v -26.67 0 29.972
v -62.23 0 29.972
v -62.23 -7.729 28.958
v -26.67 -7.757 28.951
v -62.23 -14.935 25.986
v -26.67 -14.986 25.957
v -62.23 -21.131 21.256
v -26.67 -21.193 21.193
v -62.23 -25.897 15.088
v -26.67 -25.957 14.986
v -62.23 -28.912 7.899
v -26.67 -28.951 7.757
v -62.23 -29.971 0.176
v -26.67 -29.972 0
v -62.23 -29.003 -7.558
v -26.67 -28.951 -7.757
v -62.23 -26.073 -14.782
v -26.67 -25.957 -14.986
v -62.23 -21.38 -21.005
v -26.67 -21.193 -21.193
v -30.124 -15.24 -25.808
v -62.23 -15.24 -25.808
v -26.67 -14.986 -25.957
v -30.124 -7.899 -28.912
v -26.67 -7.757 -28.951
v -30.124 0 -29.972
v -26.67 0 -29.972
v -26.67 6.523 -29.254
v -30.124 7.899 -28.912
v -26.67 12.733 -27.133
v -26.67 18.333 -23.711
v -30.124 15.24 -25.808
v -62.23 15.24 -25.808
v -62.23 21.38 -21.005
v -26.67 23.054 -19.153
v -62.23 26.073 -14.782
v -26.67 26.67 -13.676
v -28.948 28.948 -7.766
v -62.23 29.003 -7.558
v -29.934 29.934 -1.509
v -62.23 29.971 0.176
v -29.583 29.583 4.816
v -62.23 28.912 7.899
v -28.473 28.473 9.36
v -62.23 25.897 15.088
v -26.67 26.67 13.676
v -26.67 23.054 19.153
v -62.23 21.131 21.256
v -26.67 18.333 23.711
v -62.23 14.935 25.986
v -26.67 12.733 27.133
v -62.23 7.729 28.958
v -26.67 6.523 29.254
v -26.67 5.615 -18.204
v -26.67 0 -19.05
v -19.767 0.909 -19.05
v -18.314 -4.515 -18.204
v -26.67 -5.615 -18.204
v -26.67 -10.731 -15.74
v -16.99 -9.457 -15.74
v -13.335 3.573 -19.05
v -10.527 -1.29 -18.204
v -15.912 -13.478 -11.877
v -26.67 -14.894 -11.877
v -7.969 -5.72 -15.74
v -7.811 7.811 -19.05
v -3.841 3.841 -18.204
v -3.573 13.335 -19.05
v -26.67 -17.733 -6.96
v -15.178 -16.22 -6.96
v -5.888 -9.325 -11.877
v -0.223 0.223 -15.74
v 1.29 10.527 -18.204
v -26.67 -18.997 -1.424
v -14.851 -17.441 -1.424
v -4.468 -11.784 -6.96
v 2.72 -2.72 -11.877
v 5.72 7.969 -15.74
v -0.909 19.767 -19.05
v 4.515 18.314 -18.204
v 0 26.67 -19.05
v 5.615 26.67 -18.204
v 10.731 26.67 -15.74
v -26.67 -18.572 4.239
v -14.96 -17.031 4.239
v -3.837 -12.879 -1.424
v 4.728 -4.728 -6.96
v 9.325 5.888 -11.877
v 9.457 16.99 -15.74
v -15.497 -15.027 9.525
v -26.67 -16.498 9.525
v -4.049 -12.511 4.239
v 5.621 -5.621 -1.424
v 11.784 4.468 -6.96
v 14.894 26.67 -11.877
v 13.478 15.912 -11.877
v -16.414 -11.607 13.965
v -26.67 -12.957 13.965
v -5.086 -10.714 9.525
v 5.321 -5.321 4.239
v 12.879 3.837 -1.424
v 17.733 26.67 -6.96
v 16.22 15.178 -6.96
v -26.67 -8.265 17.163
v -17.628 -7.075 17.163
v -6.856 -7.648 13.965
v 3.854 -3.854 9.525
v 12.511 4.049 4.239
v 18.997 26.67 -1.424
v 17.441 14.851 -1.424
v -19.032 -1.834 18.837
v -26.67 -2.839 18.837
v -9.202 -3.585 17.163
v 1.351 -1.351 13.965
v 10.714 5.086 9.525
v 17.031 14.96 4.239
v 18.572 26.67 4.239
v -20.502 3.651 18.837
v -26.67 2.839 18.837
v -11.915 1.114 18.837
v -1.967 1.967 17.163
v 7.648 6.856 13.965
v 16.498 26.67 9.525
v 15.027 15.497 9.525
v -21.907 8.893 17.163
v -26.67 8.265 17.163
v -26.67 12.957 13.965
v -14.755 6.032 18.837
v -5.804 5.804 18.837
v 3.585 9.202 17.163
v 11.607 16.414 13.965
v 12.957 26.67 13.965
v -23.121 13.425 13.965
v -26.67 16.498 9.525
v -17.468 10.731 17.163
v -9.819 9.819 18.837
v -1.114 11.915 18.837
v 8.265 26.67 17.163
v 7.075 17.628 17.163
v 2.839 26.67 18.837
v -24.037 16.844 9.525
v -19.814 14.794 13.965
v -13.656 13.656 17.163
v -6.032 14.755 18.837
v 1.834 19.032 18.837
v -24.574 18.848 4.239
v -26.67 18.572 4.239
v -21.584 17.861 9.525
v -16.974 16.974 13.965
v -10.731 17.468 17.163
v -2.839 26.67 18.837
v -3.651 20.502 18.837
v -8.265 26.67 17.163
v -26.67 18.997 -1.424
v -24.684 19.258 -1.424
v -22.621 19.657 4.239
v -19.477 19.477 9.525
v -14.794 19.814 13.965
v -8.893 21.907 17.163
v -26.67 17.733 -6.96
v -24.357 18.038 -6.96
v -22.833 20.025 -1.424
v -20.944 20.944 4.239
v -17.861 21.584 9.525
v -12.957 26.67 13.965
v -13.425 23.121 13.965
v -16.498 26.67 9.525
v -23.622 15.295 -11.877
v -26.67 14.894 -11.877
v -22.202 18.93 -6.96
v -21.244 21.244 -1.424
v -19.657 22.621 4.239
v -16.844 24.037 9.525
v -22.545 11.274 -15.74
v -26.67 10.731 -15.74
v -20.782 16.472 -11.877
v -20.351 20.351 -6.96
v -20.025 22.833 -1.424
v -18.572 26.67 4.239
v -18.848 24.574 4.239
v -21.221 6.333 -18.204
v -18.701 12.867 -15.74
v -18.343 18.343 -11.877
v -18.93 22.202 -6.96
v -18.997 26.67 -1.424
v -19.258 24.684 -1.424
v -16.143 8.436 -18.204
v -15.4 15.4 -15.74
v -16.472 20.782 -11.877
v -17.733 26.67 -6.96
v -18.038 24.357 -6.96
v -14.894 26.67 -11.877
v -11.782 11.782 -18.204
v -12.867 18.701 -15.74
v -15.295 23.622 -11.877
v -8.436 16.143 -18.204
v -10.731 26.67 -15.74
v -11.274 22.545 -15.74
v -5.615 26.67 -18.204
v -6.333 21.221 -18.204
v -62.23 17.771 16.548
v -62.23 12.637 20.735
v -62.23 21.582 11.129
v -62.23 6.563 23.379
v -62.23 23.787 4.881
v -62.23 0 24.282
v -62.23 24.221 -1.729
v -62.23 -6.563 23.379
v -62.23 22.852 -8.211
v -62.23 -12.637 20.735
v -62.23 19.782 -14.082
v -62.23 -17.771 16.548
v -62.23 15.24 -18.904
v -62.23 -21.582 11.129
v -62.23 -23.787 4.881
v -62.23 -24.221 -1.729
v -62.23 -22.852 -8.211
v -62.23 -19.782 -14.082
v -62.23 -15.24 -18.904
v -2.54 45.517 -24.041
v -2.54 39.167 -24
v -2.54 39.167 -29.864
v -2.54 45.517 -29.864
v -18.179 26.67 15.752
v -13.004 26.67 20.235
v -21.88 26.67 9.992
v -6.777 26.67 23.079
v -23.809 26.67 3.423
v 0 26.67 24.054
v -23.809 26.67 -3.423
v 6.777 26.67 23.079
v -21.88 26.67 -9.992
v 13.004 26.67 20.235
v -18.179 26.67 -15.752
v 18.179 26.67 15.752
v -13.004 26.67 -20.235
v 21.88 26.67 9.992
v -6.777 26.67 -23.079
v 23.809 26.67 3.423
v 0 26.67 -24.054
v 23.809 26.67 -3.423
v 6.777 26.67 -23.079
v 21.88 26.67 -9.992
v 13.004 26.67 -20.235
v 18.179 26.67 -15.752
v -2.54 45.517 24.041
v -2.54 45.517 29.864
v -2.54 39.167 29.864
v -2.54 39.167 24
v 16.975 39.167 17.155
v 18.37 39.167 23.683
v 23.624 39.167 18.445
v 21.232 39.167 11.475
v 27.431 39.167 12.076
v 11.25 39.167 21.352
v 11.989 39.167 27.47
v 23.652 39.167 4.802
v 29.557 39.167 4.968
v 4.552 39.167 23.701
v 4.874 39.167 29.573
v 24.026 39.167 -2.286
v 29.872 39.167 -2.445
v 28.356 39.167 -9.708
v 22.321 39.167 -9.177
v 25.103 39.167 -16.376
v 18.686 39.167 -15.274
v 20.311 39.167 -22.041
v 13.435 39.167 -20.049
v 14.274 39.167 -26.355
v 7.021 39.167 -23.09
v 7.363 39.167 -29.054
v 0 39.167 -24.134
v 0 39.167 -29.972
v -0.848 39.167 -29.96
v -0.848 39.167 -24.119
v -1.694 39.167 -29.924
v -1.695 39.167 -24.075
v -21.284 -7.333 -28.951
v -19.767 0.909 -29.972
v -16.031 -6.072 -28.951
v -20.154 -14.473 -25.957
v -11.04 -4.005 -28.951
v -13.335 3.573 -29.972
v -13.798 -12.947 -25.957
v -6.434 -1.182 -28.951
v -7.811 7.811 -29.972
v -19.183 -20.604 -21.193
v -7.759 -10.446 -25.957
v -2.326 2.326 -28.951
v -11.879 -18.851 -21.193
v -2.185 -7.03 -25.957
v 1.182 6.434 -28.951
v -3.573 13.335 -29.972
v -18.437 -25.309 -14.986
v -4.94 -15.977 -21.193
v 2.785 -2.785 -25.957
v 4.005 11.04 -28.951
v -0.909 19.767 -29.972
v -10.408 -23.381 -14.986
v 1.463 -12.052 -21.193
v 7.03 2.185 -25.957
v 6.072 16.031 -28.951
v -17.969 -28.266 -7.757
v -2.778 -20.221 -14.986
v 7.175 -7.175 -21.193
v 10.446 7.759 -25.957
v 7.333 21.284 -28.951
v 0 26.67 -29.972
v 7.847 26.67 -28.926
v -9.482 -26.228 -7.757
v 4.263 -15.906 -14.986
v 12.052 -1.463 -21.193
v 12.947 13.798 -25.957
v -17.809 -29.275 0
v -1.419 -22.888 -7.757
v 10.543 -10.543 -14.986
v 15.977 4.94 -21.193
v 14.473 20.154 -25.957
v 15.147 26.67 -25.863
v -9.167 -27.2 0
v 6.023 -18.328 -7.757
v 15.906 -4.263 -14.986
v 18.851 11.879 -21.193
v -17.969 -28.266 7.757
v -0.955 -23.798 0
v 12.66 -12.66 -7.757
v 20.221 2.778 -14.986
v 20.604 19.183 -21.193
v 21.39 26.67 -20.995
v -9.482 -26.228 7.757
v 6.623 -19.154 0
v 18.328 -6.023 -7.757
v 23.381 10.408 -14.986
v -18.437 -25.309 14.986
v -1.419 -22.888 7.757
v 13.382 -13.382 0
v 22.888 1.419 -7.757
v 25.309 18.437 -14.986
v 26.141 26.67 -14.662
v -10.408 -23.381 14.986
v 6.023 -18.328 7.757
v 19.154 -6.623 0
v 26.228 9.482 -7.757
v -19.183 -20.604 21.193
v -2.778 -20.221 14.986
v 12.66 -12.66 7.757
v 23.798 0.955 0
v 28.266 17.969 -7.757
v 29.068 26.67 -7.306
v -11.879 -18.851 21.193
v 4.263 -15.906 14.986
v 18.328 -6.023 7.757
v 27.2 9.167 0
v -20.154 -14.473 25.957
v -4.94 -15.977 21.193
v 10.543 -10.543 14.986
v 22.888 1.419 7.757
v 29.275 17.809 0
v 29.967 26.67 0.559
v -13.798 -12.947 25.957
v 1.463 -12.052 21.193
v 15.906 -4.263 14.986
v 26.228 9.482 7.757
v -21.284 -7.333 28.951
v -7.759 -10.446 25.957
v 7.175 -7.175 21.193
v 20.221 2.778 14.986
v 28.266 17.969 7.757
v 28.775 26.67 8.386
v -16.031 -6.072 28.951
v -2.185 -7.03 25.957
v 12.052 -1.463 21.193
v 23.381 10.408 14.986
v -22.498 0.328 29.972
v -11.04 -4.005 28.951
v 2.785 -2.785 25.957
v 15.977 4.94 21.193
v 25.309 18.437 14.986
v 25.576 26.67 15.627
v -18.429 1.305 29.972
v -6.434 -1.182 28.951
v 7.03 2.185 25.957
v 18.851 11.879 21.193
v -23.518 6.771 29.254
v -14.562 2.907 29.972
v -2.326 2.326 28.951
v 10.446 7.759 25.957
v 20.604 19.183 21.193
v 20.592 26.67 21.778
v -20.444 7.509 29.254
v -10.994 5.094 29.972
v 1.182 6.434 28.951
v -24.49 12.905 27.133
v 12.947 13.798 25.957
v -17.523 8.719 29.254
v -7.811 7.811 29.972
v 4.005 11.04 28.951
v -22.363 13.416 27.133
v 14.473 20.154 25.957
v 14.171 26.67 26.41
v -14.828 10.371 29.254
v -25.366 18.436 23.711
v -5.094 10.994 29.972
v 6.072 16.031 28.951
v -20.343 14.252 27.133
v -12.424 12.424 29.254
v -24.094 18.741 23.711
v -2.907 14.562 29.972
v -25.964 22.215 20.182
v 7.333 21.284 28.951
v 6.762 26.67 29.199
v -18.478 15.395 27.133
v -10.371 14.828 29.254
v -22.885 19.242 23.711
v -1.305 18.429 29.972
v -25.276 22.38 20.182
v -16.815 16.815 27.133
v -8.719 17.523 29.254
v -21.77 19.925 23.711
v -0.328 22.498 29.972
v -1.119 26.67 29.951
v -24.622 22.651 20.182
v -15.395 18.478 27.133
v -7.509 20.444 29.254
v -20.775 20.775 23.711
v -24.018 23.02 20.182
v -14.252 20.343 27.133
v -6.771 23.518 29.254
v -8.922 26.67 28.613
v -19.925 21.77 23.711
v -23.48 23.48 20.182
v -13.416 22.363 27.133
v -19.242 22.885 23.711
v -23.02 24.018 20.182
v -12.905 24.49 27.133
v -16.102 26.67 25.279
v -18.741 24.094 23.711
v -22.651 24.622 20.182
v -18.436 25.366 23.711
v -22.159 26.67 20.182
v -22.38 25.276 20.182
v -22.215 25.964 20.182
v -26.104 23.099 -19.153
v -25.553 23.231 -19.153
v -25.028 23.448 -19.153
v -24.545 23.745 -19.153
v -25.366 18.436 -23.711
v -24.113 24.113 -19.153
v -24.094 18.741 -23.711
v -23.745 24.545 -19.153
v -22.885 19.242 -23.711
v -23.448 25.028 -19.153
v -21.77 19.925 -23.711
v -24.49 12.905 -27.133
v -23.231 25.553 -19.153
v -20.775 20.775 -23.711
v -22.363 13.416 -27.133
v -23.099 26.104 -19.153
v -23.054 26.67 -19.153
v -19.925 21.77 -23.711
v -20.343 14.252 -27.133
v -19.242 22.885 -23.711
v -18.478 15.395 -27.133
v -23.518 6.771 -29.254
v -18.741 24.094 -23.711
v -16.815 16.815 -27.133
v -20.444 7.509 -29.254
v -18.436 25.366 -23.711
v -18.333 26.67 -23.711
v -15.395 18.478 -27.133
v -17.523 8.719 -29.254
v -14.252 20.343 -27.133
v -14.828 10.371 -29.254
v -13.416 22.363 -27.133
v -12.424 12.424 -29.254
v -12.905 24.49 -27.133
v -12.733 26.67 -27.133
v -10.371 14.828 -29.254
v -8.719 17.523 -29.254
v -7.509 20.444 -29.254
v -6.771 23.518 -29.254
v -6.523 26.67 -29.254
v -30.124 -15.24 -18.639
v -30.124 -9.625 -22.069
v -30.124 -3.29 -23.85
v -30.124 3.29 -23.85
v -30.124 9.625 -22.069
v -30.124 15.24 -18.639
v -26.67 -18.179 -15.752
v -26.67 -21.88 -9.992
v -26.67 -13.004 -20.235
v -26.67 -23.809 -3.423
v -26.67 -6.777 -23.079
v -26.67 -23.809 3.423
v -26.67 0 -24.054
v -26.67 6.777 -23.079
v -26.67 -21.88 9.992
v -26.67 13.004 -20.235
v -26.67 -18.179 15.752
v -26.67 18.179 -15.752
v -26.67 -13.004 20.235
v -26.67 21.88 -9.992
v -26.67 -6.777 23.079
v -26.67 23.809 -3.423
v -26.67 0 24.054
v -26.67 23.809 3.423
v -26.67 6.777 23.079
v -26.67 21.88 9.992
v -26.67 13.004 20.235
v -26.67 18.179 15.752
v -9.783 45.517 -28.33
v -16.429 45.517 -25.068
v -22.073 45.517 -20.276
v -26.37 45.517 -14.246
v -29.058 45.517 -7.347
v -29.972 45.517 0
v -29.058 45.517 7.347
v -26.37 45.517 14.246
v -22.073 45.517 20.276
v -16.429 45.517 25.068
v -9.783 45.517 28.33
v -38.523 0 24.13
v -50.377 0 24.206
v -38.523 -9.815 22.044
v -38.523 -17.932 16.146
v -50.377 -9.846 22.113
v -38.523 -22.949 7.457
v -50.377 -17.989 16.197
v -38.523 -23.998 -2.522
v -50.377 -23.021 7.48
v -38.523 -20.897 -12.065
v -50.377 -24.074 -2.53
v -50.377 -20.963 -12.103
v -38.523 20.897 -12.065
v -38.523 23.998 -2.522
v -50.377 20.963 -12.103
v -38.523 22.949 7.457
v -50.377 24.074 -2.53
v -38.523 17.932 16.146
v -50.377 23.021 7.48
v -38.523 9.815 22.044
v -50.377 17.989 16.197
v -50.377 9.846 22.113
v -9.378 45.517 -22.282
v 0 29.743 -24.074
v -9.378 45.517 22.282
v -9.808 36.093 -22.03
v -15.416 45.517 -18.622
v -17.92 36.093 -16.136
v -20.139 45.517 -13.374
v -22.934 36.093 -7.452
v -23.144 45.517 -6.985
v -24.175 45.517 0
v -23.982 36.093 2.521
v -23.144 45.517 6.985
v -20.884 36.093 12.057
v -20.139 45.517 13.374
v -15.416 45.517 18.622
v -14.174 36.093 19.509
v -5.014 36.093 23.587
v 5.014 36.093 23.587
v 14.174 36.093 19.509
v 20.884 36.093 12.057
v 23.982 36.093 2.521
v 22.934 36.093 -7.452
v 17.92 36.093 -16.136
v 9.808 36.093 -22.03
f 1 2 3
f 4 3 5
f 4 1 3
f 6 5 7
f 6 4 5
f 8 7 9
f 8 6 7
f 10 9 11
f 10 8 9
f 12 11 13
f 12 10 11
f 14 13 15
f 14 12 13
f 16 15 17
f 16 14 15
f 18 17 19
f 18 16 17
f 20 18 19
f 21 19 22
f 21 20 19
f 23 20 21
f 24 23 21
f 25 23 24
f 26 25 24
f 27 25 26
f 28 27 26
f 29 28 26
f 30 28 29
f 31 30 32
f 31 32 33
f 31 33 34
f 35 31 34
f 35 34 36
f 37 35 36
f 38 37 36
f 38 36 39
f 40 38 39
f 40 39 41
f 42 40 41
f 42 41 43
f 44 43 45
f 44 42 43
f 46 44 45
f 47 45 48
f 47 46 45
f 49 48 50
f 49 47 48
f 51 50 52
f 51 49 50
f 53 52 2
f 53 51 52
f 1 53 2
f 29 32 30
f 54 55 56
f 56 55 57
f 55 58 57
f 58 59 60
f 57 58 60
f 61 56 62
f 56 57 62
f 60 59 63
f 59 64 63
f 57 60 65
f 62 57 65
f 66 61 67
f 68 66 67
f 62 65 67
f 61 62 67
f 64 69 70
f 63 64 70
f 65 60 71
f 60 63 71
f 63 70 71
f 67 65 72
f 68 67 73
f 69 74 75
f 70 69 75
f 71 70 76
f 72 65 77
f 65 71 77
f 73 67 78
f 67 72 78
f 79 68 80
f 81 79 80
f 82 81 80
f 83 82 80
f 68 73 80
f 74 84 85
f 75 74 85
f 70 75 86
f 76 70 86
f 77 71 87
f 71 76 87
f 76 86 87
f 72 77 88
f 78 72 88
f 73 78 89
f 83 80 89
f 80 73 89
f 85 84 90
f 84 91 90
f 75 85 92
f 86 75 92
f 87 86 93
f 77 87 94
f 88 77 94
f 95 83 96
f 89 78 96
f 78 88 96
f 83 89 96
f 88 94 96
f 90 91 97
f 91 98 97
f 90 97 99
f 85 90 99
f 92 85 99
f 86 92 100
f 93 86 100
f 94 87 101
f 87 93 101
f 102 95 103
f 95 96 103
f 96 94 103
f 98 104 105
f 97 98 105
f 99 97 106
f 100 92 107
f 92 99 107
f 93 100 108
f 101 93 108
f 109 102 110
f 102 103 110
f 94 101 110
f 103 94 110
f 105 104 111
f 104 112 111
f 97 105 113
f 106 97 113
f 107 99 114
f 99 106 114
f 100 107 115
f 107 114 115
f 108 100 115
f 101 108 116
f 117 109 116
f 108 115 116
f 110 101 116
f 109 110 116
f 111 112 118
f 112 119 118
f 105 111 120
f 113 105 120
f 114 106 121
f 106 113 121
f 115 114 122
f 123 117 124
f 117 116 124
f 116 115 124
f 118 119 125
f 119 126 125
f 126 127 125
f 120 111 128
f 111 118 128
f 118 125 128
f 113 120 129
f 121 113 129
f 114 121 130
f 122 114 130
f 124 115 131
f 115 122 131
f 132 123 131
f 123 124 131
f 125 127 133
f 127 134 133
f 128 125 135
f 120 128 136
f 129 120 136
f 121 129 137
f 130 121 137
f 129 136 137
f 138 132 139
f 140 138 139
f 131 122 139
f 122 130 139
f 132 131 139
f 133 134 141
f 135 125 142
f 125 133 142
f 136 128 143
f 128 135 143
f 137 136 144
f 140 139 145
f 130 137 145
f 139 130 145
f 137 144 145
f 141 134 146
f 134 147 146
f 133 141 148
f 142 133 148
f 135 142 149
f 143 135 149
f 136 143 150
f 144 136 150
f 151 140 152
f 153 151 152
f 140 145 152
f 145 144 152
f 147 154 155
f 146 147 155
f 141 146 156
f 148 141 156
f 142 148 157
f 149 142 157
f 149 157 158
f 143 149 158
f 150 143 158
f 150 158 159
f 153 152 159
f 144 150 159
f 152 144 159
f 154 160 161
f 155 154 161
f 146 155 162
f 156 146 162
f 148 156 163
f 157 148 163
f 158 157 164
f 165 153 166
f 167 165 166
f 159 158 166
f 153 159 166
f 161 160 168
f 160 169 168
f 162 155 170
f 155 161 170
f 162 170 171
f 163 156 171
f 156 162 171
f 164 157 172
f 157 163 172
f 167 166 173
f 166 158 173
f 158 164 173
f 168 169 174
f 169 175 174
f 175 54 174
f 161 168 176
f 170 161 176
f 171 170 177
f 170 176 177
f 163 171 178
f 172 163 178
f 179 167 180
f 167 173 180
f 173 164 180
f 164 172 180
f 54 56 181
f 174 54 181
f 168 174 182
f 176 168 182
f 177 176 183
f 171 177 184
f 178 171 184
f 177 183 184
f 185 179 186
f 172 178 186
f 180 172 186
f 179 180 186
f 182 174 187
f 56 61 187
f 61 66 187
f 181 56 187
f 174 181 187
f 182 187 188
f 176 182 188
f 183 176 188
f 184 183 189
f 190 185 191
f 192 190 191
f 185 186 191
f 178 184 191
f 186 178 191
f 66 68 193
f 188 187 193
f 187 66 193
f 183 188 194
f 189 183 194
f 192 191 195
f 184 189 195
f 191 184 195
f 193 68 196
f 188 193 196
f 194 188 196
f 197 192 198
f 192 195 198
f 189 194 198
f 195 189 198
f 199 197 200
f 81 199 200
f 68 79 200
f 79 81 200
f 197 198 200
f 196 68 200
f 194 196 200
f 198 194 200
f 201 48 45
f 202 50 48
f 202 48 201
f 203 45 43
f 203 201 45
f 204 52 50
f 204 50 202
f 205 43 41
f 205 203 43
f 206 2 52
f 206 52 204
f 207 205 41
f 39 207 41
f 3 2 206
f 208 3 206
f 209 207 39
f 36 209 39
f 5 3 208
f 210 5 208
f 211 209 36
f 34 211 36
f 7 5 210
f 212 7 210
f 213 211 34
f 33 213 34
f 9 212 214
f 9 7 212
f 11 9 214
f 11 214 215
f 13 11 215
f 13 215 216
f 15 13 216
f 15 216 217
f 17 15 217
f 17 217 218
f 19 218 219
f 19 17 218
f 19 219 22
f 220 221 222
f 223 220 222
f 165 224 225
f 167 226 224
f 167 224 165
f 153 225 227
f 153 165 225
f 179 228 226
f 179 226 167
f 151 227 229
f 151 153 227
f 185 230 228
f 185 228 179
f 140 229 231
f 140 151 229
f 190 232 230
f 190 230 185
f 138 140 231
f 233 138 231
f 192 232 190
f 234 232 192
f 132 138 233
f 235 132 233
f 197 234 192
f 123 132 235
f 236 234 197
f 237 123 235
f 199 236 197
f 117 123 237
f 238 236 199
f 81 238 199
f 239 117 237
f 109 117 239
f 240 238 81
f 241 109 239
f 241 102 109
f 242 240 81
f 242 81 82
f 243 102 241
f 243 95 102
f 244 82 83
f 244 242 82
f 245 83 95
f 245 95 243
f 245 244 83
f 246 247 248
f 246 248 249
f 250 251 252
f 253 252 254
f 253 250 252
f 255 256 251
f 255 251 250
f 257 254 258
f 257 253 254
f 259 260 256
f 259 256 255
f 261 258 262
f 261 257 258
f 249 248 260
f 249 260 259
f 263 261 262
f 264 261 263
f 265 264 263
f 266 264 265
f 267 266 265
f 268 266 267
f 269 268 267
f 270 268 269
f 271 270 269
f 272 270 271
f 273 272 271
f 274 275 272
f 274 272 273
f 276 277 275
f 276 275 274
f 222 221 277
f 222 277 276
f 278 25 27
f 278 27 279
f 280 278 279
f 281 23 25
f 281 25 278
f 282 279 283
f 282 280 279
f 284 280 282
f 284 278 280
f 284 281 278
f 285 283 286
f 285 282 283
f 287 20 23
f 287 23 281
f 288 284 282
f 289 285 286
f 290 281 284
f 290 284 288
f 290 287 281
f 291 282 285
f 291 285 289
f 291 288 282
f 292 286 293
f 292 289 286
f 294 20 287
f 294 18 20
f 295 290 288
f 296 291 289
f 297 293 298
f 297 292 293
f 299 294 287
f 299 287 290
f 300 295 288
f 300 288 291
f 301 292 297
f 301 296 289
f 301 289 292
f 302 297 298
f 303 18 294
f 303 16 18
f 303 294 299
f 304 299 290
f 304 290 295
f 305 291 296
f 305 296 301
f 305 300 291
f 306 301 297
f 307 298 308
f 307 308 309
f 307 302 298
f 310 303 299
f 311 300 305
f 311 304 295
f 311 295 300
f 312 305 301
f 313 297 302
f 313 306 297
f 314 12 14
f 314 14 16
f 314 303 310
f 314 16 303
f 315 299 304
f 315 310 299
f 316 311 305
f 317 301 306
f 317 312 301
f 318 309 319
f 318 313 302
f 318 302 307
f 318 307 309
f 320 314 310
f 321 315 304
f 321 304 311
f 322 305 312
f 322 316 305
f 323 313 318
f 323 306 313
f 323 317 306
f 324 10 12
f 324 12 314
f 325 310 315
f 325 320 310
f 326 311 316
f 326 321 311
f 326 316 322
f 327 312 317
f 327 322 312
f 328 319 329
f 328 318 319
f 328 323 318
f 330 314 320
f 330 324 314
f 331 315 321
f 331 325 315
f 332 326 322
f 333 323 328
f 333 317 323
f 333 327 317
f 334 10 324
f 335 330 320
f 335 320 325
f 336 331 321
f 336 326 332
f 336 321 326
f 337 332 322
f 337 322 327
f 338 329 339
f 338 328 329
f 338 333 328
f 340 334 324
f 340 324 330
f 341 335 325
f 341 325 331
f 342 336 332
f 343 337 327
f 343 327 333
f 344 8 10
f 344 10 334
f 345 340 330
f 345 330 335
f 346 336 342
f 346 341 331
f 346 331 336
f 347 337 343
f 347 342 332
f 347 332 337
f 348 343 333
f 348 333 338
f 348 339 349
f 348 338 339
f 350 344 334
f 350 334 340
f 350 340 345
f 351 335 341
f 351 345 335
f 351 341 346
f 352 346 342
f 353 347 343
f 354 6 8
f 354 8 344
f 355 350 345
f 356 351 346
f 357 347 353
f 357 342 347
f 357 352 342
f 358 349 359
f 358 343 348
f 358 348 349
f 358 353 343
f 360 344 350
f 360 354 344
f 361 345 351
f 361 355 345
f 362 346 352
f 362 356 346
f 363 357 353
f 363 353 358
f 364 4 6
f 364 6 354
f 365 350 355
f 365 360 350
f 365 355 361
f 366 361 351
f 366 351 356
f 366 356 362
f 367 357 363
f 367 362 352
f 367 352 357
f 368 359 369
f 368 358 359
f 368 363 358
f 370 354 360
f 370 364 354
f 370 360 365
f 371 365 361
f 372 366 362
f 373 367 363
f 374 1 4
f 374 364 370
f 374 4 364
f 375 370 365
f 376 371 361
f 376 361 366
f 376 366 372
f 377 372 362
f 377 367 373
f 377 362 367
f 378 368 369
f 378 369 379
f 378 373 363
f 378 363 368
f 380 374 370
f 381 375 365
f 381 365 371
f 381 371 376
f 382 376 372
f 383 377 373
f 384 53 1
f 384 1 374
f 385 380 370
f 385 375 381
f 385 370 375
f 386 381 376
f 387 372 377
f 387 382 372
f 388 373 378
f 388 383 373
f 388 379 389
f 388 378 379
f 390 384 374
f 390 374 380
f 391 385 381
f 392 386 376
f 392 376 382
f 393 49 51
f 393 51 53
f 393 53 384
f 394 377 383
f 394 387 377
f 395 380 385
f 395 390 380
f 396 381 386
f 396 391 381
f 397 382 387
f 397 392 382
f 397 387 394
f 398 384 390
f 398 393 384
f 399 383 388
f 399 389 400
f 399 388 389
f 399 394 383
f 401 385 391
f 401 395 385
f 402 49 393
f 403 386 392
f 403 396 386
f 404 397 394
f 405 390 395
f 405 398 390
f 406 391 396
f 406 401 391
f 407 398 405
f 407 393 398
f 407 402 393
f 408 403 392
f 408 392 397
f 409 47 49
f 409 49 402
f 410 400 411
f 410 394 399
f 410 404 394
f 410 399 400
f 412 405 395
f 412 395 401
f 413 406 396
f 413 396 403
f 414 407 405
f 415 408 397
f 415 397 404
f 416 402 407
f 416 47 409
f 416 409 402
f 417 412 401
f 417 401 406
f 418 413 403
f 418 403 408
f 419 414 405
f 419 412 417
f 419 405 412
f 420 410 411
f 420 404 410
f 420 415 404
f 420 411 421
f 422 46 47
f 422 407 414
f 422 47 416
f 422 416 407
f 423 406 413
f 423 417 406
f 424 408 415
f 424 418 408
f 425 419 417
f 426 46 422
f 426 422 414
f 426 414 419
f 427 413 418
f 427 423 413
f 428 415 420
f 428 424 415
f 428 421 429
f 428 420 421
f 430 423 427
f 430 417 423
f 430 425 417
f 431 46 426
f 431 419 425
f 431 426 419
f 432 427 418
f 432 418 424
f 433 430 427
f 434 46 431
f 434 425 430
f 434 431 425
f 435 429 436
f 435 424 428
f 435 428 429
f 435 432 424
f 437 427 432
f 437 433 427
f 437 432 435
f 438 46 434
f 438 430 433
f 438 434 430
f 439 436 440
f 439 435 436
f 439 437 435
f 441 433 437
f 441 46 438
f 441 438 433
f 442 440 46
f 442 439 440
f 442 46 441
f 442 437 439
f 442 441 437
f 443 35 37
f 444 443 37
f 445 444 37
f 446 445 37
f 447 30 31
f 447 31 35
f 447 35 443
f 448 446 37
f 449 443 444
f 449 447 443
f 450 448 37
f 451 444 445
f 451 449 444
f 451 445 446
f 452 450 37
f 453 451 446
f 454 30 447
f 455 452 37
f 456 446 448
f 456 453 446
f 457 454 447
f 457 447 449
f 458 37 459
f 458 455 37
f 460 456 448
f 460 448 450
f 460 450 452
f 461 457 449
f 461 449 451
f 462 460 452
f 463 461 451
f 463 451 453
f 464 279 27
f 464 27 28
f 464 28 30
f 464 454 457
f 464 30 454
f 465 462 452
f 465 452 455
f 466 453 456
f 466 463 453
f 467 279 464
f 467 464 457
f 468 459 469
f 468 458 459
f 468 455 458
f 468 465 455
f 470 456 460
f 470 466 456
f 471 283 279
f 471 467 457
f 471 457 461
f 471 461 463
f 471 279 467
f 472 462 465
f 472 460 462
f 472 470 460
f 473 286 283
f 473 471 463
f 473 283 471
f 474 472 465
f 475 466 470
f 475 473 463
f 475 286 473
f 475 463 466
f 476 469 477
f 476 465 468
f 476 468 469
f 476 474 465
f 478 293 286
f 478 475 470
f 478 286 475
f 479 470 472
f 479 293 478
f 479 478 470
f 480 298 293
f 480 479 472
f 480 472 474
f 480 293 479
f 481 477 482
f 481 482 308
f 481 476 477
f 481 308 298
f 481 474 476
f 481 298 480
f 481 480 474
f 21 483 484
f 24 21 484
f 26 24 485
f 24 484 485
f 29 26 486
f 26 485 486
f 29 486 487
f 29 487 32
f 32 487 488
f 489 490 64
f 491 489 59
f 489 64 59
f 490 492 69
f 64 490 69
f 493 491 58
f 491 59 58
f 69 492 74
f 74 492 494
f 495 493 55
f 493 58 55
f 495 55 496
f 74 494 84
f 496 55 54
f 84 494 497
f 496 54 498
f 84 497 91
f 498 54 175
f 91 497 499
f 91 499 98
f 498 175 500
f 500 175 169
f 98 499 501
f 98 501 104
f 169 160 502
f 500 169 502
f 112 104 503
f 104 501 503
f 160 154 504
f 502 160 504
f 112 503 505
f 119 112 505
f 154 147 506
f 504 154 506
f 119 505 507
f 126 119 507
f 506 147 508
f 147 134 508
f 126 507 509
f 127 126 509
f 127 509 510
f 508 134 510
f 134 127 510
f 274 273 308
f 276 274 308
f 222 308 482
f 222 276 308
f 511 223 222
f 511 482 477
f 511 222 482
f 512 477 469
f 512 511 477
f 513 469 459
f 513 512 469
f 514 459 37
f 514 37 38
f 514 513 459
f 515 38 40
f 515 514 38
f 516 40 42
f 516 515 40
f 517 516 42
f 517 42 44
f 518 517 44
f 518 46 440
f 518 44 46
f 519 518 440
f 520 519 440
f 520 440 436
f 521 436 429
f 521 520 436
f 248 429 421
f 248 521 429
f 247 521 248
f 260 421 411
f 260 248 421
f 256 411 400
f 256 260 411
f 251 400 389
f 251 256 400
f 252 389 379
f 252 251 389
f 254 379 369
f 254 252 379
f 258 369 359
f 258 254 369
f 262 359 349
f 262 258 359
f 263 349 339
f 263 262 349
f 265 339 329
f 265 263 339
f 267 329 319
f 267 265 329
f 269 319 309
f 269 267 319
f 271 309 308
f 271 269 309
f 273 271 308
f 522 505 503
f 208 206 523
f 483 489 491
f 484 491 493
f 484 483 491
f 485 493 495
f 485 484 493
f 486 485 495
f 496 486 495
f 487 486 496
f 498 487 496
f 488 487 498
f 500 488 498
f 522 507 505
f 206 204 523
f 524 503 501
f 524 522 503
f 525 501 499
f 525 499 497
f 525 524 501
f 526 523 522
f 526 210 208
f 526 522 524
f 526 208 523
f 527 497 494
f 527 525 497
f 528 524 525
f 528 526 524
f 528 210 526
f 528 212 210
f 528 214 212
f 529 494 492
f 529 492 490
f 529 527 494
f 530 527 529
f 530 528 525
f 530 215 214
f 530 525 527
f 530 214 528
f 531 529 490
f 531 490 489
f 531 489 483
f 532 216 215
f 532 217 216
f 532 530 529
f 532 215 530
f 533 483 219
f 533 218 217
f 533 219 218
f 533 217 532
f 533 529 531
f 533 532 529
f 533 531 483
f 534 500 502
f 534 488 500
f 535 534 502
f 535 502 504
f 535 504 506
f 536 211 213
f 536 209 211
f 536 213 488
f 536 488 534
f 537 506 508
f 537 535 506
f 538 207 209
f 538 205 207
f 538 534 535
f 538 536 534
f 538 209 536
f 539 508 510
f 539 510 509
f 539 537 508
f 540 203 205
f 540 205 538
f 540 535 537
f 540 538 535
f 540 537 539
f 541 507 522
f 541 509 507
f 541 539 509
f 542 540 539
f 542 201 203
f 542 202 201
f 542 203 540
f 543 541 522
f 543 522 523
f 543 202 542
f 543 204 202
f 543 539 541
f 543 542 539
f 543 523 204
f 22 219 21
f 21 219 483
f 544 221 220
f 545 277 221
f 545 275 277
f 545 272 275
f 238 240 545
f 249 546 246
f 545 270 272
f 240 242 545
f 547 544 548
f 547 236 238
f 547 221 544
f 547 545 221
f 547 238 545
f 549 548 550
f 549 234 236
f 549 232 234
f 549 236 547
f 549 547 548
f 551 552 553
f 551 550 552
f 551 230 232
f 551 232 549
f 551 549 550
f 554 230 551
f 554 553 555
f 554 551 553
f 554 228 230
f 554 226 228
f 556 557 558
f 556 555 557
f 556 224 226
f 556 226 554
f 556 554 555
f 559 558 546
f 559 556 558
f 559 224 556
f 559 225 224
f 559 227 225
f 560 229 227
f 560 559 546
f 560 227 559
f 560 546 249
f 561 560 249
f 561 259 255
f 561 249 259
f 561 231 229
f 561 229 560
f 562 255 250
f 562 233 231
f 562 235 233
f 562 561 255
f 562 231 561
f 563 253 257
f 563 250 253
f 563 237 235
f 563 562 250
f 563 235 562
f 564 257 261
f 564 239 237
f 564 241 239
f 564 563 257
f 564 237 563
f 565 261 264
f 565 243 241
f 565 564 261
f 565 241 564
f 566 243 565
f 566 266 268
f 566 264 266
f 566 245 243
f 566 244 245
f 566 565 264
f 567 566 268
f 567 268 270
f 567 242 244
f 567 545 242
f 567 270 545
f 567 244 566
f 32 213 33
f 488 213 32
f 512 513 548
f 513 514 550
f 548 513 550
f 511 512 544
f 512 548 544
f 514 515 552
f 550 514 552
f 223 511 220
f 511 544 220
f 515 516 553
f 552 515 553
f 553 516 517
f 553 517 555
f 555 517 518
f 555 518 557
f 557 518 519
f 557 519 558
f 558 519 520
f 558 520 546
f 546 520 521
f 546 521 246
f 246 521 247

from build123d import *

# Parameters (mm, degrees)
SKETCH3_R               = 29.972
SKETCH3_R_2             = 19.05
SKETCH6_W               = 49.478831
SKETCH6_H               = 30.48
CUT_EXTRUDE2_DEPTH      = 93.970246
CUT_EXTRUDE3_DEPTH      = 93.970246
CUT_EXTRUDE3_DEPTH_BACK = 2.54
SKETCH7_W               = 63.5
SKETCH7_H               = 6.35
SKETCH8_R               = 43.612232
CUT_EXTRUDE4_DEPTH      = 103.320343


with BuildPart() as part:
    # Sketch1 → Revolve1 (revolve)
    with BuildSketch(Plane.XY):
        Polygon((-62.23, -29.972), (-26.67, -29.972), (-26.67, -24.0538), (-62.23, -24.2824), align=None)
    revolve(axis=Axis((-62.23, 0, 0), (1, 0, 0)))


with BuildPart() as body_2:
    # Sketch2 → Revolve2 (revolve)
    with BuildSketch(Plane.XY):
        Polygon((24.2824, 62.23), (24.0538, 26.67), (29.972, 26.67), (29.972, 62.23), align=None)
    revolve(axis=Axis((0, 0, 0), (0, 1, 0)))


with BuildPart() as sweep1_tool:
    # Sweep1: sweep along a path in Sketch4
    with BuildLine(Plane.XY) as sweep1_path:
        ThreePointArc((-26.67, 0), (-7.811462, 7.811462), (0, 26.67))
    # Sketch3 → Sweep1 (sweep)
    with BuildSketch(Plane(origin=(-26.67, 0, 0), x_dir=(0, 0, -1), z_dir=(1, 0, 0))):
        Circle(SKETCH3_R)
        Circle(SKETCH3_R_2, mode=Mode.SUBTRACT)
    sweep(path=sweep1_path.line)


with BuildPart() as part_1:
    add(part.part)


with BuildPart() as part_2:
    # Sweep1: joined with sweep1_tool
    add(part_1.part.fuse(sweep1_tool.part, body_2.part, tol=0.00001))

    # Sketch6 → Cut-Extrude2 (cut, through all)
    with BuildSketch(Plane.XY):
        with Locations((-54.863748, 0)):
            Rectangle(SKETCH6_W, SKETCH6_H)
    extrude(amount=-CUT_EXTRUDE2_DEPTH, mode=Mode.SUBTRACT)

    # Sketch7 → Cut-Extrude3 (cut, two sides: drawn at the far end of the back side and taken through both)
    with BuildSketch(Plane(origin=(0, 0, 0), x_dir=(0, 0, -1), z_dir=(1, 0, 0)).offset(-CUT_EXTRUDE3_DEPTH_BACK)):
        with Locations((0, 42.3418)):
            Rectangle(SKETCH7_W, SKETCH7_H)
    extrude(amount=CUT_EXTRUDE3_DEPTH + CUT_EXTRUDE3_DEPTH_BACK, mode=Mode.SUBTRACT)

    # Sketch8 → Cut-Extrude4 (cut, through all)
    with BuildSketch(Plane.XZ.offset(-45.5168)):
        Circle(SKETCH8_R)
    extrude(amount=-CUT_EXTRUDE4_DEPTH, mode=Mode.SUBTRACT)


solid = part_2.part
